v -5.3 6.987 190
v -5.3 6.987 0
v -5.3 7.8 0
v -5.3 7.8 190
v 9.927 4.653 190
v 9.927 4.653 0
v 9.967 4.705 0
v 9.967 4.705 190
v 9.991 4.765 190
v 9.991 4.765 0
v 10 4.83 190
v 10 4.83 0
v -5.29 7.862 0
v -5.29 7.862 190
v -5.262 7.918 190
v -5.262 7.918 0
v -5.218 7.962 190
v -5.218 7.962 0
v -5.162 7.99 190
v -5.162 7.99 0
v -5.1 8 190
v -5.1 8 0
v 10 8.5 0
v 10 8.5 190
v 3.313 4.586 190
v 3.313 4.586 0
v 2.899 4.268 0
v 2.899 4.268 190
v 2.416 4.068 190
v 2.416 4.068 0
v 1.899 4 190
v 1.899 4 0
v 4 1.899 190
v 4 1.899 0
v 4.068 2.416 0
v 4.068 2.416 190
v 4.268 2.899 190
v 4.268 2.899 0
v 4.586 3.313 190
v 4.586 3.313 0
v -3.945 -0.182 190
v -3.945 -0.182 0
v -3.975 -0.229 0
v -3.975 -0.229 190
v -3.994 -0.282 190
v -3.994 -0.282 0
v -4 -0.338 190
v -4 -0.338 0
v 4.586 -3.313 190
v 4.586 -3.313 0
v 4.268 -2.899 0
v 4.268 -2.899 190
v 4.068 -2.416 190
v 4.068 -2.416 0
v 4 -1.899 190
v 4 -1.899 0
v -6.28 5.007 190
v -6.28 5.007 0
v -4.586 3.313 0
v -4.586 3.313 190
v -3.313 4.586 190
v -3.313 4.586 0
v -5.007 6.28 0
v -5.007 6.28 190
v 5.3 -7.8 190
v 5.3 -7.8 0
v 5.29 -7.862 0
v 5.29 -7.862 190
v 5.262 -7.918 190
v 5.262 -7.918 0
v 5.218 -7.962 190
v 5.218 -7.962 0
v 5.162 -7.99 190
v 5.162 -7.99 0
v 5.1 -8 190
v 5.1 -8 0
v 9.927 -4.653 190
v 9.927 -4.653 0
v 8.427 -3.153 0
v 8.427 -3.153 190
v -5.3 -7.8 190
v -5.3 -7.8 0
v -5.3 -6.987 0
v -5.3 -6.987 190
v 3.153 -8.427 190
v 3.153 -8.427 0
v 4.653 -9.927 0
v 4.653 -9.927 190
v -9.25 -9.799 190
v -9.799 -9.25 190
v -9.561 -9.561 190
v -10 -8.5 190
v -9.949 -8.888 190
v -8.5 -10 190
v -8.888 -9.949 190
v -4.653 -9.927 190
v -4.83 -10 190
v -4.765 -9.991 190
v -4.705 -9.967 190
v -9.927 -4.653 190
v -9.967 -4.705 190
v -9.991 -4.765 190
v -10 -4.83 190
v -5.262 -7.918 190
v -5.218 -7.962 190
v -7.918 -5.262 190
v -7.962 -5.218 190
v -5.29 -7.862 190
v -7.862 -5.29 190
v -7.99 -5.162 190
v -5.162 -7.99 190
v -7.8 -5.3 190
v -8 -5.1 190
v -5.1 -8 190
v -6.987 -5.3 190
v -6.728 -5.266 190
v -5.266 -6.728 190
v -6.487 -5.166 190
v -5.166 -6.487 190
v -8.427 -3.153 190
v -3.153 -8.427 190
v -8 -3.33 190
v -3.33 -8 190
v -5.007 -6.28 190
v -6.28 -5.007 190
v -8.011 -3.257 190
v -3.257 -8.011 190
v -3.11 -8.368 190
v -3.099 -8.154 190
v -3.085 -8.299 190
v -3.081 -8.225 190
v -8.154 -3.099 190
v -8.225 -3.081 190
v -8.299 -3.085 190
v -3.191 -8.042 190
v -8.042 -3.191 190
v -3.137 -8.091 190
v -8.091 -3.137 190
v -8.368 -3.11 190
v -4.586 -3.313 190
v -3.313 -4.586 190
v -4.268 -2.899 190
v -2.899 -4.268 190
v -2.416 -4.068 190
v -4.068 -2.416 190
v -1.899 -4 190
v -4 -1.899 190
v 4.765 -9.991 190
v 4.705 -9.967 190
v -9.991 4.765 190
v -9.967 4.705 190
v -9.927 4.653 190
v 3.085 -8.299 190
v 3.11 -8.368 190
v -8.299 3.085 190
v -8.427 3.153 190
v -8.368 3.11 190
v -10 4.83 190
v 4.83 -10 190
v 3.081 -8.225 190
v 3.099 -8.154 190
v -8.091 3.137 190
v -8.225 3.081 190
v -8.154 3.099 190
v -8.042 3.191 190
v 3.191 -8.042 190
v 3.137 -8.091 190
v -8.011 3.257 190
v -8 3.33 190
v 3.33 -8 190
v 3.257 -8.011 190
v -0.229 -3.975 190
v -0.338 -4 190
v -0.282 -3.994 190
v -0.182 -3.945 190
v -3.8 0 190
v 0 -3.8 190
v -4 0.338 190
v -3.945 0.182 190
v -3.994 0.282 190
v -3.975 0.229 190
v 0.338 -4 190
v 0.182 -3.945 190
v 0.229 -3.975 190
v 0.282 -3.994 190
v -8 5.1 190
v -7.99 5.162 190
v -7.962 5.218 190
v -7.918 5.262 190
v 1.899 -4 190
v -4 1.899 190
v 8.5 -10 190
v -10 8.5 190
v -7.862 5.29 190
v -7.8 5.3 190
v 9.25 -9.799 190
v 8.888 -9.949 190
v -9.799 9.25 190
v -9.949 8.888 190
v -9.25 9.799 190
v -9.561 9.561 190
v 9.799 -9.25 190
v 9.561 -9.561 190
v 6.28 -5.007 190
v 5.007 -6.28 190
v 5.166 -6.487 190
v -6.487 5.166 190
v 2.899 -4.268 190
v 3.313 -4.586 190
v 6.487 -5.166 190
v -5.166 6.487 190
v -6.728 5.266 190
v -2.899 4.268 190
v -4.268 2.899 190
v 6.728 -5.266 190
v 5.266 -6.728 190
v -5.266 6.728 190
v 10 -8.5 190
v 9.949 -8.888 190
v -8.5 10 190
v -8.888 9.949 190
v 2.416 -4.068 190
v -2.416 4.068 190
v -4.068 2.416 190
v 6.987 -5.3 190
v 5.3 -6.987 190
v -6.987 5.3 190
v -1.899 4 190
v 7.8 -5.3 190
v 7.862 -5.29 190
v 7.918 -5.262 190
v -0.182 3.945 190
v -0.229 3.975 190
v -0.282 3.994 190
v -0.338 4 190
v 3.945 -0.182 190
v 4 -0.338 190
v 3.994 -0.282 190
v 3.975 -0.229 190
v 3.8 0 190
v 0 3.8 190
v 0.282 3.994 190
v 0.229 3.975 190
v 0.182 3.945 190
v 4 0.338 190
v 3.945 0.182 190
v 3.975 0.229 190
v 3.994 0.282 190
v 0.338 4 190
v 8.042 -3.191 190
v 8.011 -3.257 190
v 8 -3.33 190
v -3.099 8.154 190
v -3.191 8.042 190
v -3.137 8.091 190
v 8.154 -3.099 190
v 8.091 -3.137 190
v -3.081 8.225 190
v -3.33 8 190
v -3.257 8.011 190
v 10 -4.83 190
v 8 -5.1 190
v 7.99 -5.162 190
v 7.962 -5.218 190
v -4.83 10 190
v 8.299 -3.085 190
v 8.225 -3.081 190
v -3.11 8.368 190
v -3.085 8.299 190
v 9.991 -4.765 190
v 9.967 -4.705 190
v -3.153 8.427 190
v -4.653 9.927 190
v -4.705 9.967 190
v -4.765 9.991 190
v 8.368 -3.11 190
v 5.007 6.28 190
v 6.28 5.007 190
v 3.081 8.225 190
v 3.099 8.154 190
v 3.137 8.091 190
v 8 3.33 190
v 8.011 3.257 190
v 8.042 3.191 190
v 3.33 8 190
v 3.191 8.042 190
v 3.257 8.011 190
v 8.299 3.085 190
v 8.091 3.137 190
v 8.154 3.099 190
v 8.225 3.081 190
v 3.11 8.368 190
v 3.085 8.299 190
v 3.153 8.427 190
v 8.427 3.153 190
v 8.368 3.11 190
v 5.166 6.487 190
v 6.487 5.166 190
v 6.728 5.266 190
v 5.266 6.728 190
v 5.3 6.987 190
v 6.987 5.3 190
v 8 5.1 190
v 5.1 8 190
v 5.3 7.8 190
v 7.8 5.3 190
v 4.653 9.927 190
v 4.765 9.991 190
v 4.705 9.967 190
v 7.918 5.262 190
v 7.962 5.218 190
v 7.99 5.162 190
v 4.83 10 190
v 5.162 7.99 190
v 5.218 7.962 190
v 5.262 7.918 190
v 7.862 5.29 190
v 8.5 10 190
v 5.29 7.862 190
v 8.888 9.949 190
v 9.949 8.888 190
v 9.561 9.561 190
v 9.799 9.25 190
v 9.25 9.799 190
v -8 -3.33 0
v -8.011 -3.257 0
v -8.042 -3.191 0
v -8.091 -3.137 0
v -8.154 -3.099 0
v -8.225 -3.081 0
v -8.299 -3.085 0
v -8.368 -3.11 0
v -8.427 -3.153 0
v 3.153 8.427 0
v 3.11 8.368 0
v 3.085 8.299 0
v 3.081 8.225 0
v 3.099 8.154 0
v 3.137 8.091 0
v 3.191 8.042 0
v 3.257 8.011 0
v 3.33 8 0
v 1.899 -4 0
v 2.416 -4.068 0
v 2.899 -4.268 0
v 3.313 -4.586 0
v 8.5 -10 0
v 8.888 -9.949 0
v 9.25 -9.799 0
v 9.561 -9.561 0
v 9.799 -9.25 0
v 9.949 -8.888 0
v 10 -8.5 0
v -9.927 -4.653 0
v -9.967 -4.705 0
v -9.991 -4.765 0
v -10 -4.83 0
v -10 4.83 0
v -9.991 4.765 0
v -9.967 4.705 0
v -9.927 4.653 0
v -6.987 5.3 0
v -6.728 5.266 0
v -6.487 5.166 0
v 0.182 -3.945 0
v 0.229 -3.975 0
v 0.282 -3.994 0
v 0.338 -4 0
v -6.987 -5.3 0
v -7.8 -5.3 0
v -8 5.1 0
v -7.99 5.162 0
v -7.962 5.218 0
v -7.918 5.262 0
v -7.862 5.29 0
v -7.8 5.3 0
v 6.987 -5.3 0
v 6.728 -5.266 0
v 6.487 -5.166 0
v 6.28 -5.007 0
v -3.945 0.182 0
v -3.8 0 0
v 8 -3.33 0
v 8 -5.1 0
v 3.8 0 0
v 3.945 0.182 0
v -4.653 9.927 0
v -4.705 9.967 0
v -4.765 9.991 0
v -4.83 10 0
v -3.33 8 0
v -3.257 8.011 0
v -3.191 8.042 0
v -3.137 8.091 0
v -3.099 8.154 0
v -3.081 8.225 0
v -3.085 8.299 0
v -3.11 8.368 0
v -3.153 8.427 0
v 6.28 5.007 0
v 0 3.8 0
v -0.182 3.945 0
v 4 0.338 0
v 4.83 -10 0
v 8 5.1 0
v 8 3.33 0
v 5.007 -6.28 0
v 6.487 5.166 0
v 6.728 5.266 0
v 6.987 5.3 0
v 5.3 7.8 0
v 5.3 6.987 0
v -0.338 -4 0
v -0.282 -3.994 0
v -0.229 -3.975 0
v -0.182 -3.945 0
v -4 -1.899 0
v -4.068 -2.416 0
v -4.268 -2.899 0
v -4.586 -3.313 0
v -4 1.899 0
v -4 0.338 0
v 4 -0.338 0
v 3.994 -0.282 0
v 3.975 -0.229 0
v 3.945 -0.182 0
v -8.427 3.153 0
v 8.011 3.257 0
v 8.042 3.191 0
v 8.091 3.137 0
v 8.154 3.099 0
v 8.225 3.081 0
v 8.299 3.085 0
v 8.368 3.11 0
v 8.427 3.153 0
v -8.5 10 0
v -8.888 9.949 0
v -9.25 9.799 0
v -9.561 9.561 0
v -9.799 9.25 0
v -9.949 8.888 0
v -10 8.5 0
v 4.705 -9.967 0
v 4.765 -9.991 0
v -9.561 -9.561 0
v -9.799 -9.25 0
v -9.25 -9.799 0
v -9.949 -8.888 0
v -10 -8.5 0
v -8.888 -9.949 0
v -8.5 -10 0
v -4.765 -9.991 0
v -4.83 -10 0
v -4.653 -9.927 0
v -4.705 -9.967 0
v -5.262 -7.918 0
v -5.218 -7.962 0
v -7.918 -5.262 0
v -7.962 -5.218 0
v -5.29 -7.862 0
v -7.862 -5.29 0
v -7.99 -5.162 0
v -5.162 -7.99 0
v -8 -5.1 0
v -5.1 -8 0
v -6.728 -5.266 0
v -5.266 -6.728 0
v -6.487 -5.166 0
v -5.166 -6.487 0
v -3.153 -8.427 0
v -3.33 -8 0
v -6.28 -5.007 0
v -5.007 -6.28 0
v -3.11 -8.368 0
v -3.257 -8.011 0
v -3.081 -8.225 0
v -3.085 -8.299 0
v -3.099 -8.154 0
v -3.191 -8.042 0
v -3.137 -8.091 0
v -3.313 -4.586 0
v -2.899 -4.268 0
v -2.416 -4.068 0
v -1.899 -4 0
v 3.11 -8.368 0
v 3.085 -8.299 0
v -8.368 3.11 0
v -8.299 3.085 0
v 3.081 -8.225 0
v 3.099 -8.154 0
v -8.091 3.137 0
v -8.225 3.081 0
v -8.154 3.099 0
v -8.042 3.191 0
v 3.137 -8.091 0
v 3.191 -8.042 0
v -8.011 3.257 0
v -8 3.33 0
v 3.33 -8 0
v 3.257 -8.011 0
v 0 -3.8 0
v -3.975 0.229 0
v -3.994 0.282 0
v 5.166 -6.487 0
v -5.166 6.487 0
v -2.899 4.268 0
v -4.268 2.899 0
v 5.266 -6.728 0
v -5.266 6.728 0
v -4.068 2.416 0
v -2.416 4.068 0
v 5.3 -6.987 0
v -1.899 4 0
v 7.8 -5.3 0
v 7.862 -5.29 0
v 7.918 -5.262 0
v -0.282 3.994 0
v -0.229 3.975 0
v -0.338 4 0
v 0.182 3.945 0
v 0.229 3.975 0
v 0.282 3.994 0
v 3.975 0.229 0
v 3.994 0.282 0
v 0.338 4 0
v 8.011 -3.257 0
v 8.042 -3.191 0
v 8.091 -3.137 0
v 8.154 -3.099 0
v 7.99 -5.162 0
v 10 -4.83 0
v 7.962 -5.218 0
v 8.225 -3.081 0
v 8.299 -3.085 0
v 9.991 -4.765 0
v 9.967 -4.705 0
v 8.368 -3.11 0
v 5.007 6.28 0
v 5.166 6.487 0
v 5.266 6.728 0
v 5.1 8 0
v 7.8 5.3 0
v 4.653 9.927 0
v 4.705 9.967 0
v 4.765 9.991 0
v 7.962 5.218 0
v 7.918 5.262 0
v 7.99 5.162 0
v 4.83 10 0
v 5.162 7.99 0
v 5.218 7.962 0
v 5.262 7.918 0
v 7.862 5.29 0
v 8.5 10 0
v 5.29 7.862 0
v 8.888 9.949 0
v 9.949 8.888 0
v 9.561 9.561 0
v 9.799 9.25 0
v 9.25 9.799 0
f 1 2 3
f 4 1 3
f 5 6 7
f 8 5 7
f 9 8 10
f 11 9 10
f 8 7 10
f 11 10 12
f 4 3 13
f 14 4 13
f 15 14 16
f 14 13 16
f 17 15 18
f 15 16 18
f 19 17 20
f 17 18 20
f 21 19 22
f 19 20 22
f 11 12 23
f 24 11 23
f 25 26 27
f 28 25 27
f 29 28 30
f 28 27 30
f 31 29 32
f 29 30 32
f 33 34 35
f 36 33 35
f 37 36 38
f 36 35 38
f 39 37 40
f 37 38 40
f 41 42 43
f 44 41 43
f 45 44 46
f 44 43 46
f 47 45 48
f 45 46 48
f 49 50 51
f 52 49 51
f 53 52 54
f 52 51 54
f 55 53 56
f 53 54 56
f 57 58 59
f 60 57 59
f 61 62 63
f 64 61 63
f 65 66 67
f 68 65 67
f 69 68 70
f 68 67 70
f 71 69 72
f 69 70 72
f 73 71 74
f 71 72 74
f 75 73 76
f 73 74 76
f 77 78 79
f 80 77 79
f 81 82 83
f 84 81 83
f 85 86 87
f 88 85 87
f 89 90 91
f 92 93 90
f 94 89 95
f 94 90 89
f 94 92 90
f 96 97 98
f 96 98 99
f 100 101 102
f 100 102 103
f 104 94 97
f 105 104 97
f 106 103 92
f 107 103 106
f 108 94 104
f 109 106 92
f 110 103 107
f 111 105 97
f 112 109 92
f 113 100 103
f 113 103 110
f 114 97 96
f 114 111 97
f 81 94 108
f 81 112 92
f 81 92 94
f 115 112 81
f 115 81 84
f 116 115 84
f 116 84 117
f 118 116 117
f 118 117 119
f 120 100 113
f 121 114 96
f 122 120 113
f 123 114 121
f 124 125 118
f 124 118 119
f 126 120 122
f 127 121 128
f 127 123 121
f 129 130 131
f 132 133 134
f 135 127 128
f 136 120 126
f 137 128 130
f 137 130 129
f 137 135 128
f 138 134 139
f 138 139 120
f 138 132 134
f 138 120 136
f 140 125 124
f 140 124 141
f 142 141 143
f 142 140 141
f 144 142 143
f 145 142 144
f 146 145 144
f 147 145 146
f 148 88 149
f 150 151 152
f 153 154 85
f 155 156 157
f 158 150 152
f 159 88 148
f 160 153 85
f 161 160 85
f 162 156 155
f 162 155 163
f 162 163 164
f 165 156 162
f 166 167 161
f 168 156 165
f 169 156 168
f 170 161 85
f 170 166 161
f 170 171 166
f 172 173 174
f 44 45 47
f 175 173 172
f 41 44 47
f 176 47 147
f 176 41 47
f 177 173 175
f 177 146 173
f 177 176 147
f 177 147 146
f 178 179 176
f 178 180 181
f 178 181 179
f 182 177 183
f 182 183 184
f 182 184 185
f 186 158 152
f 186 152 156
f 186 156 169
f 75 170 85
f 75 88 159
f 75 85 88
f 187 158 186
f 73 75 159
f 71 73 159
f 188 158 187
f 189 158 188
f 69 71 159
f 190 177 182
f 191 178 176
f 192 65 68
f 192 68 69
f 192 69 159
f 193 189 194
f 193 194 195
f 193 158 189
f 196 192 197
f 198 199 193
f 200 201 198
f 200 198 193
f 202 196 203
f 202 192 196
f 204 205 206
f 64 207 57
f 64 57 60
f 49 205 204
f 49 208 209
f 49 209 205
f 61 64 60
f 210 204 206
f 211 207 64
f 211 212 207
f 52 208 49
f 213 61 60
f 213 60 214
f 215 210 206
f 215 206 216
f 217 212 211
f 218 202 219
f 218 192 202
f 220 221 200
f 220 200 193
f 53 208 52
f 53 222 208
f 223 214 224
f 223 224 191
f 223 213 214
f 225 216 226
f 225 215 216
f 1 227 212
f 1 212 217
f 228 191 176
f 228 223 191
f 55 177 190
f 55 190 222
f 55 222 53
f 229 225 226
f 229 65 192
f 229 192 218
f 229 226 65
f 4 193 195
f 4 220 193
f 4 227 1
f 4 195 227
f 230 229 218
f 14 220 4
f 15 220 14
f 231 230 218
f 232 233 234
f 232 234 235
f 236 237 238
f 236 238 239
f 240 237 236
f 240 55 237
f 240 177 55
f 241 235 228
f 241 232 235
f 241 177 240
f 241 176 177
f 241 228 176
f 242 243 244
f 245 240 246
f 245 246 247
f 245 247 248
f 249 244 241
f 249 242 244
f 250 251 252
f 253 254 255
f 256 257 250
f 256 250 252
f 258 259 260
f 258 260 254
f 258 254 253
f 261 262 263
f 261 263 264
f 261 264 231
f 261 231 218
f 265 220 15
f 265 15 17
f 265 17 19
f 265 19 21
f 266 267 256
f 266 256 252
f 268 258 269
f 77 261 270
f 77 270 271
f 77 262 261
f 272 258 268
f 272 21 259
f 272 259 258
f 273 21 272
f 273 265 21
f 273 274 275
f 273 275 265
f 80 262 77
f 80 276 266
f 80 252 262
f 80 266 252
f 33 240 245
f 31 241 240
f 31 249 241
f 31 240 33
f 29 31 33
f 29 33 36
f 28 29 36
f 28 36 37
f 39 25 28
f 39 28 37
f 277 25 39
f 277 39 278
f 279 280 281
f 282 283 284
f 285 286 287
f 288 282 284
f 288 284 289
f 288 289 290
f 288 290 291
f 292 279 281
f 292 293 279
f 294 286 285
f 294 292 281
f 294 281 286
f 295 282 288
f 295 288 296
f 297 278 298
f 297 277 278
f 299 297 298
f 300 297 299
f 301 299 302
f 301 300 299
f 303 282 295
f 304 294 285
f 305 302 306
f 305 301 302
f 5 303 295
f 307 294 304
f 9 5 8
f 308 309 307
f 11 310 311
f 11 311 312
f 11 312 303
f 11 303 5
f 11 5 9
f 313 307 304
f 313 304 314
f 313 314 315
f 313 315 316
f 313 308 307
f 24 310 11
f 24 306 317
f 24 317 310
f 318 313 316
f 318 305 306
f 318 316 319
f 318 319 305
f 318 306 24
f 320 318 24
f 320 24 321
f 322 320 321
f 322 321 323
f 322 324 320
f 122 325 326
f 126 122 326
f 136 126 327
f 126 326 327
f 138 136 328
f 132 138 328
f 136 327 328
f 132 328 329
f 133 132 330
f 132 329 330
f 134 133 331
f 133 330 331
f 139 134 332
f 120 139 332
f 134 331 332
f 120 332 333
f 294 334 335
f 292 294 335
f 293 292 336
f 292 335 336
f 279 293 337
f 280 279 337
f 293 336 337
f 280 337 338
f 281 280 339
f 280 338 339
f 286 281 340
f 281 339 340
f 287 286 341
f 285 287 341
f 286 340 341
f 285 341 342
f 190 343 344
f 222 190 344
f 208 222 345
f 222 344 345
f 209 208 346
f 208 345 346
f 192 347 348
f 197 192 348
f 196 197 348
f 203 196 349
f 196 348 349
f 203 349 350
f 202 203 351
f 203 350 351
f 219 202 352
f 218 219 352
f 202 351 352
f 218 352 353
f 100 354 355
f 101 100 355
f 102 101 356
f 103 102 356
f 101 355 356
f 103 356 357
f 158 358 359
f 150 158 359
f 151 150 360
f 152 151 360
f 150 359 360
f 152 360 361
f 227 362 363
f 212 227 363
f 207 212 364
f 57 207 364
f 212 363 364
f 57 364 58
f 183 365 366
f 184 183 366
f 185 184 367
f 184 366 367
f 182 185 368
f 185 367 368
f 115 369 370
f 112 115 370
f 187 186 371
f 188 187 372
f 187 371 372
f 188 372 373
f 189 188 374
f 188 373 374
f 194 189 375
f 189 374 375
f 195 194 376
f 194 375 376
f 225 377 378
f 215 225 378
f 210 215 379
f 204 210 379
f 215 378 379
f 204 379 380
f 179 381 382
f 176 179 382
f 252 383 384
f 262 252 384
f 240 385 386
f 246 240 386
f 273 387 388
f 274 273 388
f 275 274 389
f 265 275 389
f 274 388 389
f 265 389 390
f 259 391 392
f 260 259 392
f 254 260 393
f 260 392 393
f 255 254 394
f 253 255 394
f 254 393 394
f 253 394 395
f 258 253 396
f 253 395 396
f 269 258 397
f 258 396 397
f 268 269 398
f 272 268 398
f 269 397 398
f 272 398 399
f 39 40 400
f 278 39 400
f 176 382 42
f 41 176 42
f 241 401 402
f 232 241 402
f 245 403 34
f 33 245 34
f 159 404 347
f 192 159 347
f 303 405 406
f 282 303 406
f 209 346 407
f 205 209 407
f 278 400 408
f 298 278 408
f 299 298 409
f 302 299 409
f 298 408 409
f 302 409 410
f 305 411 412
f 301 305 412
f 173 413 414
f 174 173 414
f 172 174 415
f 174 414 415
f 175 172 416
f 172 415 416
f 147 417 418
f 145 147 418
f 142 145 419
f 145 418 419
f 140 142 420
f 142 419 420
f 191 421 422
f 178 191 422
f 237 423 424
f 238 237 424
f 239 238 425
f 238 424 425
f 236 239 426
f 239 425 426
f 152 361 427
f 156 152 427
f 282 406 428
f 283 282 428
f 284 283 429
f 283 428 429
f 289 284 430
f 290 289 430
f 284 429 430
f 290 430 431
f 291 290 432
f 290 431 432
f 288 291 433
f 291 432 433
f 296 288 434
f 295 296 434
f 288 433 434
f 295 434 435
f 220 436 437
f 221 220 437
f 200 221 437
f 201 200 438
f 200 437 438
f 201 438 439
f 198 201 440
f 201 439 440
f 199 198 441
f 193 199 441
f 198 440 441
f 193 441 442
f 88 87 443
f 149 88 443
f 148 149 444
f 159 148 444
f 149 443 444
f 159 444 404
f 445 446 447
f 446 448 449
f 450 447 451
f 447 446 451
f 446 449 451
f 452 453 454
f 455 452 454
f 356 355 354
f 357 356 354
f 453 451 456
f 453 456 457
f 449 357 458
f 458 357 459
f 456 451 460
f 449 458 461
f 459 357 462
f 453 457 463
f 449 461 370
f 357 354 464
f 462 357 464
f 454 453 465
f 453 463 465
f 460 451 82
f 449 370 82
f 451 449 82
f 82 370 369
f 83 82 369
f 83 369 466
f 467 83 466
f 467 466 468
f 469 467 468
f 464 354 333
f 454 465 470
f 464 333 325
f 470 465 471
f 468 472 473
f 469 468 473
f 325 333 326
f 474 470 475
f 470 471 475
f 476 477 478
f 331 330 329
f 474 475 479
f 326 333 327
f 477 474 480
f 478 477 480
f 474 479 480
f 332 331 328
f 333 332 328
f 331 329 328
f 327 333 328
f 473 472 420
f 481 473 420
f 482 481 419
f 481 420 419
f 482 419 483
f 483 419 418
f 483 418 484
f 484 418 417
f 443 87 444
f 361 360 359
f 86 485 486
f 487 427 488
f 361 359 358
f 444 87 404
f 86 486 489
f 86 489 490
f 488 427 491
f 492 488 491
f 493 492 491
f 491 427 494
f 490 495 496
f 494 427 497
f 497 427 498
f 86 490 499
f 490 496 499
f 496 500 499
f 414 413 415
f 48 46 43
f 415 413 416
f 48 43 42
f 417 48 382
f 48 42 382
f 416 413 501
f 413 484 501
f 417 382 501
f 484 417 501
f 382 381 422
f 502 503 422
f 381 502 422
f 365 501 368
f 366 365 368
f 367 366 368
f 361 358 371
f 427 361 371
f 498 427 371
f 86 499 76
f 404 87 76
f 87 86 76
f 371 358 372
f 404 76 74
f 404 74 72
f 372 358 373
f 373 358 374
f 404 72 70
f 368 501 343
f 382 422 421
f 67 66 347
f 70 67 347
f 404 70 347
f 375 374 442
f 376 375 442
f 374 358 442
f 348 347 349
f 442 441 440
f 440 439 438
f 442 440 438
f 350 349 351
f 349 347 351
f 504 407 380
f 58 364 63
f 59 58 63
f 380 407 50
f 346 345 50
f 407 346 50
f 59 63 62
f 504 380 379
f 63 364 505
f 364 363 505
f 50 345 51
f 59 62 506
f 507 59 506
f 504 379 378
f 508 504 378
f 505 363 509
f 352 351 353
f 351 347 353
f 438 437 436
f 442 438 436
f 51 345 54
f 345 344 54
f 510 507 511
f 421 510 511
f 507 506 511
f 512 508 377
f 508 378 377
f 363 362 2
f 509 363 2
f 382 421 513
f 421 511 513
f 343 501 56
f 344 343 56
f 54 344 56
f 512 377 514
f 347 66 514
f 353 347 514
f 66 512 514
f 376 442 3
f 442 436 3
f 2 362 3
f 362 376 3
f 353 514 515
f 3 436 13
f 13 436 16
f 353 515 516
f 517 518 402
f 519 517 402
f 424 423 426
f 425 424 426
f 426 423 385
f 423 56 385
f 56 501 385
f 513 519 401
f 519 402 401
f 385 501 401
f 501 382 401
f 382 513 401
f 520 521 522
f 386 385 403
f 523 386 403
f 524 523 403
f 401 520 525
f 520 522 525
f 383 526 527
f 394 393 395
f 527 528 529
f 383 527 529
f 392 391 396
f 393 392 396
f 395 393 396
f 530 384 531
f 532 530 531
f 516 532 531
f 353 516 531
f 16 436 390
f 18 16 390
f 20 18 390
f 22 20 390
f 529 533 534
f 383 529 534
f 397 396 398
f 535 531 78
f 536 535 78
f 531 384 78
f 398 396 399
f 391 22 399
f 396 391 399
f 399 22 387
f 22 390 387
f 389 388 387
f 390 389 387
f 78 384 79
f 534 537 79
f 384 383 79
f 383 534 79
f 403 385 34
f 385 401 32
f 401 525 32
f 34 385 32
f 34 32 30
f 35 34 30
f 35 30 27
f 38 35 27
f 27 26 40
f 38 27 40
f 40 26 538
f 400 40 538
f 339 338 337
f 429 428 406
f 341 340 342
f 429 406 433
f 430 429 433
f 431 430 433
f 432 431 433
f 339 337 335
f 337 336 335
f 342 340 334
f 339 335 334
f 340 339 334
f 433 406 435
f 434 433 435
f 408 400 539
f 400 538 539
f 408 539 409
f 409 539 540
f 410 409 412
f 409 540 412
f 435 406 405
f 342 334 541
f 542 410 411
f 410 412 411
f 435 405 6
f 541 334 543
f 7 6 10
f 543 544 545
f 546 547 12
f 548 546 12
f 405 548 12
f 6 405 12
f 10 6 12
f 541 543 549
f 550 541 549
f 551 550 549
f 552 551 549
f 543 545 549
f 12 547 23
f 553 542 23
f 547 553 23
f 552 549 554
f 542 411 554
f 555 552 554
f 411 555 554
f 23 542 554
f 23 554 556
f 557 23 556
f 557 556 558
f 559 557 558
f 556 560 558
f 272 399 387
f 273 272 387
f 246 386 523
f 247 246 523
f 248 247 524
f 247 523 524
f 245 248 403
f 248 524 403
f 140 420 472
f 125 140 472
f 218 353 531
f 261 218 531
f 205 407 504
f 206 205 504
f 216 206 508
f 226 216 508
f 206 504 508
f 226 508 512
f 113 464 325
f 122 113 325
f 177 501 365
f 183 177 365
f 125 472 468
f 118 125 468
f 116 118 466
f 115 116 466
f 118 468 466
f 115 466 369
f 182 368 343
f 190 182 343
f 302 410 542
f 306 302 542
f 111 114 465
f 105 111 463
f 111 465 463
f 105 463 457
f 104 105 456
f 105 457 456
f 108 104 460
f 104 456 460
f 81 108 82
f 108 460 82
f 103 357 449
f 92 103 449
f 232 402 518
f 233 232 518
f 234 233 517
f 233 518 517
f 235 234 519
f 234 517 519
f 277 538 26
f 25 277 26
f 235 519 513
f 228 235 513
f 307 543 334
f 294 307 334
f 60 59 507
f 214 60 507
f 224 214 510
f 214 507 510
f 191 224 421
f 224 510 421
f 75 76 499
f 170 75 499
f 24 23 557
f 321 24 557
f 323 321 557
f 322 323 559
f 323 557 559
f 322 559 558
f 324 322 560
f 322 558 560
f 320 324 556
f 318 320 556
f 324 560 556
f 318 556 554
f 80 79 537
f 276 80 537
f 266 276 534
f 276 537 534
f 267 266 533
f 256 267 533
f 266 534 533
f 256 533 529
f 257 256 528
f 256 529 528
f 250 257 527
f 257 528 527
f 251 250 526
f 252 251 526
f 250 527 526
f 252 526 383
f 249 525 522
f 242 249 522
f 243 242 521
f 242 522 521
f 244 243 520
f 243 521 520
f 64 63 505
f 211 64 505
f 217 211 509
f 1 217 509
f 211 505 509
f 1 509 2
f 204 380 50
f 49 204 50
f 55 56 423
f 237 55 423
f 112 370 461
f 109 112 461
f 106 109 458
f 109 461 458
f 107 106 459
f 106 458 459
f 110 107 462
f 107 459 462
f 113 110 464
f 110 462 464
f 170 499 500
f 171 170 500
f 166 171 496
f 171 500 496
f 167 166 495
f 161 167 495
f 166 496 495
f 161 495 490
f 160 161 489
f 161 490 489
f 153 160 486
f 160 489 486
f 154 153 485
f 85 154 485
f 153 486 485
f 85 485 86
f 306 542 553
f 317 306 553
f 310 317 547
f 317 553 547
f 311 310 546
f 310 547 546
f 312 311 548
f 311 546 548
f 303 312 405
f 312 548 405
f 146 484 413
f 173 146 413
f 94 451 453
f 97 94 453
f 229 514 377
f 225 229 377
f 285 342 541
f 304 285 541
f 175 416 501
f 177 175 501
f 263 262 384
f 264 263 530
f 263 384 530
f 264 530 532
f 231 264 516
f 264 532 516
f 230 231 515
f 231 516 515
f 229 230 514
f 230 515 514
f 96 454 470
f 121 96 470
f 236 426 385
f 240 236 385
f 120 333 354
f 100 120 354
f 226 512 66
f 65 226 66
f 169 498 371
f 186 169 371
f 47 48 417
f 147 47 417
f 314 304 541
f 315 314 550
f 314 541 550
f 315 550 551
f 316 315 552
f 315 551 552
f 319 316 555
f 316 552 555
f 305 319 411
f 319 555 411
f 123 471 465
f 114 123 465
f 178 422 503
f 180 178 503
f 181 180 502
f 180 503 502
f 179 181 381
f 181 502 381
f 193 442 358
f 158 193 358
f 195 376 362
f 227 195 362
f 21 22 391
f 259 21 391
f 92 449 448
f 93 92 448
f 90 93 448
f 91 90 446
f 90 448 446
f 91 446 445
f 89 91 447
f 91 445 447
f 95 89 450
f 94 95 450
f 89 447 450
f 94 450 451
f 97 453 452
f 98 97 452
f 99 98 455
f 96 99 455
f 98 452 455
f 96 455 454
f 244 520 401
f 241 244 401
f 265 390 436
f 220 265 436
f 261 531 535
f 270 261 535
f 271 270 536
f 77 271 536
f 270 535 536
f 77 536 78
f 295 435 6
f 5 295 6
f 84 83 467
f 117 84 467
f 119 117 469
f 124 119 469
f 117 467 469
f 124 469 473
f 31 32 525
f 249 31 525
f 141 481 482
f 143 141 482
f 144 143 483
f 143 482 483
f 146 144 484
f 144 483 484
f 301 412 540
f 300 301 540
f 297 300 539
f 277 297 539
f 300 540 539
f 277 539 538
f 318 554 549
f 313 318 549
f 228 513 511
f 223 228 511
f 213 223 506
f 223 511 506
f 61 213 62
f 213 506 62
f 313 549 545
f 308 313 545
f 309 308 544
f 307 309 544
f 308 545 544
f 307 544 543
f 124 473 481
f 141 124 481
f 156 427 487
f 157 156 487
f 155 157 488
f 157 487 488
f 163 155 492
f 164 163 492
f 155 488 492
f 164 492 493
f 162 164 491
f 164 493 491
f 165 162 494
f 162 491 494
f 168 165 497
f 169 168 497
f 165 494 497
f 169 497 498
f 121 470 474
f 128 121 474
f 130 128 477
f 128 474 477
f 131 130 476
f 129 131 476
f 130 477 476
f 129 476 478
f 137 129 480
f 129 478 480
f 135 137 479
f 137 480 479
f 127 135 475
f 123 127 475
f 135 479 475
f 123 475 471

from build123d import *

# Parameters (mm, degrees)
EXTRUDE_1_DEPTH = 190


# Read off the part's stored shape, not the designer's step: 222 Конструкционный профиль 20х20-1-surface1
with BuildPart() as part:
    # Эскиз1 → Бобышка-Вытянуть1 (new body)
    with BuildSketch(Plane.XY):
        with BuildLine():
            Line((-3.945217202, 0.181521503), (-3.8, 0))
            Line((-3.8, 0), (-3.945217202, -0.181521503))
            ThreePointArc((-3.945217202, -0.181521503), (-3.98590708, -0.254943529), (-4, -0.337695265))
            Line((-4, -0.337695265), (-4, -1.898780669))
            ThreePointArc((-4, -1.898780669), (-4.152240935, -2.664147534), (-4.585786438, -3.312994231))
            Line((-4.585786438, -3.312994231), (-6.279898987, -5.007106781))
            ThreePointArc((-6.279898987, -5.007106781), (-6.604322336, -5.223879533), (-6.987005769, -5.3))
            Line((-6.987005769, -5.3), (-7.8, -5.3))
            ThreePointArc((-7.8, -5.3), (-7.941421356, -5.241421356), (-8, -5.1))
            Line((-8, -5.1), (-8, -3.33))
            ThreePointArc((-8, -3.33), (-8.154329142, -3.099030117), (-8.426776695, -3.153223305))
            Line((-8.426776695, -3.153223305), (-9.926776695, -4.653223305))
            ThreePointArc((-9.926776695, -4.653223305), (-9.980969883, -4.734329142), (-10, -4.83))
            Line((-10, -4.83), (-10, -8.5))
            ThreePointArc((-10, -8.5), (-9.560660172, -9.560660172), (-8.5, -10))
            Line((-8.5, -10), (-4.83, -10))
            ThreePointArc((-4.83, -10), (-4.734329142, -9.980969883), (-4.653223305, -9.926776695))
            Line((-4.653223305, -9.926776695), (-3.153223305, -8.426776695))
            ThreePointArc((-3.153223305, -8.426776695), (-3.099030117, -8.154329142), (-3.33, -8))
            Line((-3.33, -8), (-5.1, -8))
            ThreePointArc((-5.1, -8), (-5.241421356, -7.941421356), (-5.3, -7.8))
            Line((-5.3, -7.8), (-5.3, -6.987005769))
            ThreePointArc((-5.3, -6.987005769), (-5.223879533, -6.604322336), (-5.007106781, -6.279898987))
            Line((-5.007106781, -6.279898987), (-3.312994231, -4.585786438))
            ThreePointArc((-3.312994231, -4.585786438), (-2.664147534, -4.152240935), (-1.898780669, -4))
            Line((-1.898780669, -4), (-0.337695265, -4))
            ThreePointArc((-0.337695265, -4), (-0.254943529, -3.98590708), (-0.181521503, -3.945217202))
            Line((-0.181521503, -3.945217202), (0, -3.8))
            Line((0, -3.8), (0.181521503, -3.945217202))
            ThreePointArc((0.181521503, -3.945217202), (0.254943529, -3.98590708), (0.337695265, -4))
            Line((0.337695265, -4), (1.898780669, -4))
            ThreePointArc((1.898780669, -4), (2.664147534, -4.152240935), (3.312994231, -4.585786438))
            Line((3.312994231, -4.585786438), (5.007106781, -6.279898987))
            ThreePointArc((5.007106781, -6.279898987), (5.223879533, -6.604322336), (5.3, -6.987005769))
            Line((5.3, -6.987005769), (5.3, -7.8))
            ThreePointArc((5.3, -7.8), (5.241421356, -7.941421356), (5.1, -8))
            Line((5.1, -8), (3.33, -8))
            ThreePointArc((3.33, -8), (3.099030117, -8.154329142), (3.153223305, -8.426776695))
            Line((3.153223305, -8.426776695), (4.653223305, -9.926776695))
            ThreePointArc((4.653223305, -9.926776695), (4.734329142, -9.980969883), (4.83, -10))
            Line((4.83, -10), (8.5, -10))
            ThreePointArc((8.5, -10), (9.560660172, -9.560660172), (10, -8.5))
            Line((10, -8.5), (10, -4.83))
            ThreePointArc((10, -4.83), (9.980969883, -4.734329142), (9.926776695, -4.653223305))
            Line((9.926776695, -4.653223305), (8.426776695, -3.153223305))
            ThreePointArc((8.426776695, -3.153223305), (8.154329142, -3.099030117), (8, -3.33))
            Line((8, -3.33), (8, -5.1))
            ThreePointArc((8, -5.1), (7.941421356, -5.241421356), (7.8, -5.3))
            Line((7.8, -5.3), (6.987005769, -5.3))
            ThreePointArc((6.987005769, -5.3), (6.604322336, -5.223879533), (6.279898987, -5.007106781))
            Line((6.279898987, -5.007106781), (4.585786438, -3.312994231))
            ThreePointArc((4.585786438, -3.312994231), (4.152240935, -2.664147534), (4, -1.898780669))
            Line((4, -1.898780669), (4, -0.337695265))
            ThreePointArc((4, -0.337695265), (3.98590708, -0.254943529), (3.945217202, -0.181521503))
            Line((3.945217202, -0.181521503), (3.8, 0))
            Line((3.8, 0), (3.945217202, 0.181521503))
            ThreePointArc((3.945217202, 0.181521503), (3.98590708, 0.254943529), (4, 0.337695265))
            Line((4, 0.337695265), (4, 1.898780669))
            ThreePointArc((4, 1.898780669), (4.152240935, 2.664147534), (4.585786438, 3.312994231))
            Line((4.585786438, 3.312994231), (6.279898987, 5.007106781))
            ThreePointArc((6.279898987, 5.007106781), (6.604322336, 5.223879533), (6.987005769, 5.3))
            Line((6.987005769, 5.3), (7.8, 5.3))
            ThreePointArc((7.8, 5.3), (7.941421356, 5.241421356), (8, 5.1))
            Line((8, 5.1), (8, 3.33))
            ThreePointArc((8, 3.33), (8.154329142, 3.099030117), (8.426776695, 3.153223305))
            Line((8.426776695, 3.153223305), (9.926776695, 4.653223305))
            ThreePointArc((9.926776695, 4.653223305), (9.980969883, 4.734329142), (10, 4.83))
            Line((10, 4.83), (10, 8.5))
            ThreePointArc((10, 8.5), (9.560660172, 9.560660172), (8.5, 10))
            Line((8.5, 10), (4.83, 10))
            ThreePointArc((4.83, 10), (4.734329142, 9.980969883), (4.653223305, 9.926776695))
            Line((4.653223305, 9.926776695), (3.153223305, 8.426776695))
            ThreePointArc((3.153223305, 8.426776695), (3.099030117, 8.154329142), (3.33, 8))
            Line((3.33, 8), (5.1, 8))
            ThreePointArc((5.1, 8), (5.241421356, 7.941421356), (5.3, 7.8))
            Line((5.3, 7.8), (5.3, 6.987005769))
            ThreePointArc((5.3, 6.987005769), (5.223879533, 6.604322336), (5.007106781, 6.279898987))
            Line((5.007106781, 6.279898987), (3.312994231, 4.585786438))
            ThreePointArc((3.312994231, 4.585786438), (2.664147534, 4.152240935), (1.898780669, 4))
            Line((1.898780669, 4), (0.337695265, 4))
            ThreePointArc((0.337695265, 4), (0.254943529, 3.98590708), (0.181521503, 3.945217202))
            Line((0.181521503, 3.945217202), (0, 3.8))
            Line((0, 3.8), (-0.181521503, 3.945217202))
            ThreePointArc((-0.181521503, 3.945217202), (-0.254943529, 3.98590708), (-0.337695265, 4))
            Line((-0.337695265, 4), (-1.898780669, 4))
            ThreePointArc((-1.898780669, 4), (-2.664147534, 4.152240935), (-3.312994231, 4.585786438))
            Line((-3.312994231, 4.585786438), (-5.007106781, 6.279898987))
            ThreePointArc((-5.007106781, 6.279898987), (-5.223879533, 6.604322336), (-5.3, 6.987005769))
            Line((-5.3, 6.987005769), (-5.3, 7.8))
            ThreePointArc((-5.3, 7.8), (-5.241421356, 7.941421356), (-5.1, 8))
            Line((-5.1, 8), (-3.33, 8))
            ThreePointArc((-3.33, 8), (-3.099030117, 8.154329142), (-3.153223305, 8.426776695))
            Line((-3.153223305, 8.426776695), (-4.653223305, 9.926776695))
            ThreePointArc((-4.653223305, 9.926776695), (-4.734329142, 9.980969883), (-4.83, 10))
            Line((-4.83, 10), (-8.5, 10))
            ThreePointArc((-8.5, 10), (-9.560660172, 9.560660172), (-10, 8.5))
            Line((-10, 8.5), (-10, 4.83))
            ThreePointArc((-10, 4.83), (-9.980969883, 4.734329142), (-9.926776695, 4.653223305))
            Line((-9.926776695, 4.653223305), (-8.426776695, 3.153223305))
            ThreePointArc((-8.426776695, 3.153223305), (-8.154329142, 3.099030117), (-8, 3.33))
            Line((-8, 3.33), (-8, 5.1))
            ThreePointArc((-8, 5.1), (-7.941421356, 5.241421356), (-7.8, 5.3))
            Line((-7.8, 5.3), (-6.987005769, 5.3))
            ThreePointArc((-6.987005769, 5.3), (-6.604322336, 5.223879533), (-6.279898987, 5.007106781))
            Line((-6.279898987, 5.007106781), (-4.585786438, 3.312994231))
            ThreePointArc((-4.585786438, 3.312994231), (-4.152240935, 2.664147534), (-4, 1.898780669))
            Line((-4, 1.898780669), (-4, 0.337695265))
            ThreePointArc((-4, 0.337695265), (-3.98590708, 0.254943529), (-3.945217202, 0.181521503))
        make_face()
    extrude(amount=EXTRUDE_1_DEPTH)


solid = part.part
